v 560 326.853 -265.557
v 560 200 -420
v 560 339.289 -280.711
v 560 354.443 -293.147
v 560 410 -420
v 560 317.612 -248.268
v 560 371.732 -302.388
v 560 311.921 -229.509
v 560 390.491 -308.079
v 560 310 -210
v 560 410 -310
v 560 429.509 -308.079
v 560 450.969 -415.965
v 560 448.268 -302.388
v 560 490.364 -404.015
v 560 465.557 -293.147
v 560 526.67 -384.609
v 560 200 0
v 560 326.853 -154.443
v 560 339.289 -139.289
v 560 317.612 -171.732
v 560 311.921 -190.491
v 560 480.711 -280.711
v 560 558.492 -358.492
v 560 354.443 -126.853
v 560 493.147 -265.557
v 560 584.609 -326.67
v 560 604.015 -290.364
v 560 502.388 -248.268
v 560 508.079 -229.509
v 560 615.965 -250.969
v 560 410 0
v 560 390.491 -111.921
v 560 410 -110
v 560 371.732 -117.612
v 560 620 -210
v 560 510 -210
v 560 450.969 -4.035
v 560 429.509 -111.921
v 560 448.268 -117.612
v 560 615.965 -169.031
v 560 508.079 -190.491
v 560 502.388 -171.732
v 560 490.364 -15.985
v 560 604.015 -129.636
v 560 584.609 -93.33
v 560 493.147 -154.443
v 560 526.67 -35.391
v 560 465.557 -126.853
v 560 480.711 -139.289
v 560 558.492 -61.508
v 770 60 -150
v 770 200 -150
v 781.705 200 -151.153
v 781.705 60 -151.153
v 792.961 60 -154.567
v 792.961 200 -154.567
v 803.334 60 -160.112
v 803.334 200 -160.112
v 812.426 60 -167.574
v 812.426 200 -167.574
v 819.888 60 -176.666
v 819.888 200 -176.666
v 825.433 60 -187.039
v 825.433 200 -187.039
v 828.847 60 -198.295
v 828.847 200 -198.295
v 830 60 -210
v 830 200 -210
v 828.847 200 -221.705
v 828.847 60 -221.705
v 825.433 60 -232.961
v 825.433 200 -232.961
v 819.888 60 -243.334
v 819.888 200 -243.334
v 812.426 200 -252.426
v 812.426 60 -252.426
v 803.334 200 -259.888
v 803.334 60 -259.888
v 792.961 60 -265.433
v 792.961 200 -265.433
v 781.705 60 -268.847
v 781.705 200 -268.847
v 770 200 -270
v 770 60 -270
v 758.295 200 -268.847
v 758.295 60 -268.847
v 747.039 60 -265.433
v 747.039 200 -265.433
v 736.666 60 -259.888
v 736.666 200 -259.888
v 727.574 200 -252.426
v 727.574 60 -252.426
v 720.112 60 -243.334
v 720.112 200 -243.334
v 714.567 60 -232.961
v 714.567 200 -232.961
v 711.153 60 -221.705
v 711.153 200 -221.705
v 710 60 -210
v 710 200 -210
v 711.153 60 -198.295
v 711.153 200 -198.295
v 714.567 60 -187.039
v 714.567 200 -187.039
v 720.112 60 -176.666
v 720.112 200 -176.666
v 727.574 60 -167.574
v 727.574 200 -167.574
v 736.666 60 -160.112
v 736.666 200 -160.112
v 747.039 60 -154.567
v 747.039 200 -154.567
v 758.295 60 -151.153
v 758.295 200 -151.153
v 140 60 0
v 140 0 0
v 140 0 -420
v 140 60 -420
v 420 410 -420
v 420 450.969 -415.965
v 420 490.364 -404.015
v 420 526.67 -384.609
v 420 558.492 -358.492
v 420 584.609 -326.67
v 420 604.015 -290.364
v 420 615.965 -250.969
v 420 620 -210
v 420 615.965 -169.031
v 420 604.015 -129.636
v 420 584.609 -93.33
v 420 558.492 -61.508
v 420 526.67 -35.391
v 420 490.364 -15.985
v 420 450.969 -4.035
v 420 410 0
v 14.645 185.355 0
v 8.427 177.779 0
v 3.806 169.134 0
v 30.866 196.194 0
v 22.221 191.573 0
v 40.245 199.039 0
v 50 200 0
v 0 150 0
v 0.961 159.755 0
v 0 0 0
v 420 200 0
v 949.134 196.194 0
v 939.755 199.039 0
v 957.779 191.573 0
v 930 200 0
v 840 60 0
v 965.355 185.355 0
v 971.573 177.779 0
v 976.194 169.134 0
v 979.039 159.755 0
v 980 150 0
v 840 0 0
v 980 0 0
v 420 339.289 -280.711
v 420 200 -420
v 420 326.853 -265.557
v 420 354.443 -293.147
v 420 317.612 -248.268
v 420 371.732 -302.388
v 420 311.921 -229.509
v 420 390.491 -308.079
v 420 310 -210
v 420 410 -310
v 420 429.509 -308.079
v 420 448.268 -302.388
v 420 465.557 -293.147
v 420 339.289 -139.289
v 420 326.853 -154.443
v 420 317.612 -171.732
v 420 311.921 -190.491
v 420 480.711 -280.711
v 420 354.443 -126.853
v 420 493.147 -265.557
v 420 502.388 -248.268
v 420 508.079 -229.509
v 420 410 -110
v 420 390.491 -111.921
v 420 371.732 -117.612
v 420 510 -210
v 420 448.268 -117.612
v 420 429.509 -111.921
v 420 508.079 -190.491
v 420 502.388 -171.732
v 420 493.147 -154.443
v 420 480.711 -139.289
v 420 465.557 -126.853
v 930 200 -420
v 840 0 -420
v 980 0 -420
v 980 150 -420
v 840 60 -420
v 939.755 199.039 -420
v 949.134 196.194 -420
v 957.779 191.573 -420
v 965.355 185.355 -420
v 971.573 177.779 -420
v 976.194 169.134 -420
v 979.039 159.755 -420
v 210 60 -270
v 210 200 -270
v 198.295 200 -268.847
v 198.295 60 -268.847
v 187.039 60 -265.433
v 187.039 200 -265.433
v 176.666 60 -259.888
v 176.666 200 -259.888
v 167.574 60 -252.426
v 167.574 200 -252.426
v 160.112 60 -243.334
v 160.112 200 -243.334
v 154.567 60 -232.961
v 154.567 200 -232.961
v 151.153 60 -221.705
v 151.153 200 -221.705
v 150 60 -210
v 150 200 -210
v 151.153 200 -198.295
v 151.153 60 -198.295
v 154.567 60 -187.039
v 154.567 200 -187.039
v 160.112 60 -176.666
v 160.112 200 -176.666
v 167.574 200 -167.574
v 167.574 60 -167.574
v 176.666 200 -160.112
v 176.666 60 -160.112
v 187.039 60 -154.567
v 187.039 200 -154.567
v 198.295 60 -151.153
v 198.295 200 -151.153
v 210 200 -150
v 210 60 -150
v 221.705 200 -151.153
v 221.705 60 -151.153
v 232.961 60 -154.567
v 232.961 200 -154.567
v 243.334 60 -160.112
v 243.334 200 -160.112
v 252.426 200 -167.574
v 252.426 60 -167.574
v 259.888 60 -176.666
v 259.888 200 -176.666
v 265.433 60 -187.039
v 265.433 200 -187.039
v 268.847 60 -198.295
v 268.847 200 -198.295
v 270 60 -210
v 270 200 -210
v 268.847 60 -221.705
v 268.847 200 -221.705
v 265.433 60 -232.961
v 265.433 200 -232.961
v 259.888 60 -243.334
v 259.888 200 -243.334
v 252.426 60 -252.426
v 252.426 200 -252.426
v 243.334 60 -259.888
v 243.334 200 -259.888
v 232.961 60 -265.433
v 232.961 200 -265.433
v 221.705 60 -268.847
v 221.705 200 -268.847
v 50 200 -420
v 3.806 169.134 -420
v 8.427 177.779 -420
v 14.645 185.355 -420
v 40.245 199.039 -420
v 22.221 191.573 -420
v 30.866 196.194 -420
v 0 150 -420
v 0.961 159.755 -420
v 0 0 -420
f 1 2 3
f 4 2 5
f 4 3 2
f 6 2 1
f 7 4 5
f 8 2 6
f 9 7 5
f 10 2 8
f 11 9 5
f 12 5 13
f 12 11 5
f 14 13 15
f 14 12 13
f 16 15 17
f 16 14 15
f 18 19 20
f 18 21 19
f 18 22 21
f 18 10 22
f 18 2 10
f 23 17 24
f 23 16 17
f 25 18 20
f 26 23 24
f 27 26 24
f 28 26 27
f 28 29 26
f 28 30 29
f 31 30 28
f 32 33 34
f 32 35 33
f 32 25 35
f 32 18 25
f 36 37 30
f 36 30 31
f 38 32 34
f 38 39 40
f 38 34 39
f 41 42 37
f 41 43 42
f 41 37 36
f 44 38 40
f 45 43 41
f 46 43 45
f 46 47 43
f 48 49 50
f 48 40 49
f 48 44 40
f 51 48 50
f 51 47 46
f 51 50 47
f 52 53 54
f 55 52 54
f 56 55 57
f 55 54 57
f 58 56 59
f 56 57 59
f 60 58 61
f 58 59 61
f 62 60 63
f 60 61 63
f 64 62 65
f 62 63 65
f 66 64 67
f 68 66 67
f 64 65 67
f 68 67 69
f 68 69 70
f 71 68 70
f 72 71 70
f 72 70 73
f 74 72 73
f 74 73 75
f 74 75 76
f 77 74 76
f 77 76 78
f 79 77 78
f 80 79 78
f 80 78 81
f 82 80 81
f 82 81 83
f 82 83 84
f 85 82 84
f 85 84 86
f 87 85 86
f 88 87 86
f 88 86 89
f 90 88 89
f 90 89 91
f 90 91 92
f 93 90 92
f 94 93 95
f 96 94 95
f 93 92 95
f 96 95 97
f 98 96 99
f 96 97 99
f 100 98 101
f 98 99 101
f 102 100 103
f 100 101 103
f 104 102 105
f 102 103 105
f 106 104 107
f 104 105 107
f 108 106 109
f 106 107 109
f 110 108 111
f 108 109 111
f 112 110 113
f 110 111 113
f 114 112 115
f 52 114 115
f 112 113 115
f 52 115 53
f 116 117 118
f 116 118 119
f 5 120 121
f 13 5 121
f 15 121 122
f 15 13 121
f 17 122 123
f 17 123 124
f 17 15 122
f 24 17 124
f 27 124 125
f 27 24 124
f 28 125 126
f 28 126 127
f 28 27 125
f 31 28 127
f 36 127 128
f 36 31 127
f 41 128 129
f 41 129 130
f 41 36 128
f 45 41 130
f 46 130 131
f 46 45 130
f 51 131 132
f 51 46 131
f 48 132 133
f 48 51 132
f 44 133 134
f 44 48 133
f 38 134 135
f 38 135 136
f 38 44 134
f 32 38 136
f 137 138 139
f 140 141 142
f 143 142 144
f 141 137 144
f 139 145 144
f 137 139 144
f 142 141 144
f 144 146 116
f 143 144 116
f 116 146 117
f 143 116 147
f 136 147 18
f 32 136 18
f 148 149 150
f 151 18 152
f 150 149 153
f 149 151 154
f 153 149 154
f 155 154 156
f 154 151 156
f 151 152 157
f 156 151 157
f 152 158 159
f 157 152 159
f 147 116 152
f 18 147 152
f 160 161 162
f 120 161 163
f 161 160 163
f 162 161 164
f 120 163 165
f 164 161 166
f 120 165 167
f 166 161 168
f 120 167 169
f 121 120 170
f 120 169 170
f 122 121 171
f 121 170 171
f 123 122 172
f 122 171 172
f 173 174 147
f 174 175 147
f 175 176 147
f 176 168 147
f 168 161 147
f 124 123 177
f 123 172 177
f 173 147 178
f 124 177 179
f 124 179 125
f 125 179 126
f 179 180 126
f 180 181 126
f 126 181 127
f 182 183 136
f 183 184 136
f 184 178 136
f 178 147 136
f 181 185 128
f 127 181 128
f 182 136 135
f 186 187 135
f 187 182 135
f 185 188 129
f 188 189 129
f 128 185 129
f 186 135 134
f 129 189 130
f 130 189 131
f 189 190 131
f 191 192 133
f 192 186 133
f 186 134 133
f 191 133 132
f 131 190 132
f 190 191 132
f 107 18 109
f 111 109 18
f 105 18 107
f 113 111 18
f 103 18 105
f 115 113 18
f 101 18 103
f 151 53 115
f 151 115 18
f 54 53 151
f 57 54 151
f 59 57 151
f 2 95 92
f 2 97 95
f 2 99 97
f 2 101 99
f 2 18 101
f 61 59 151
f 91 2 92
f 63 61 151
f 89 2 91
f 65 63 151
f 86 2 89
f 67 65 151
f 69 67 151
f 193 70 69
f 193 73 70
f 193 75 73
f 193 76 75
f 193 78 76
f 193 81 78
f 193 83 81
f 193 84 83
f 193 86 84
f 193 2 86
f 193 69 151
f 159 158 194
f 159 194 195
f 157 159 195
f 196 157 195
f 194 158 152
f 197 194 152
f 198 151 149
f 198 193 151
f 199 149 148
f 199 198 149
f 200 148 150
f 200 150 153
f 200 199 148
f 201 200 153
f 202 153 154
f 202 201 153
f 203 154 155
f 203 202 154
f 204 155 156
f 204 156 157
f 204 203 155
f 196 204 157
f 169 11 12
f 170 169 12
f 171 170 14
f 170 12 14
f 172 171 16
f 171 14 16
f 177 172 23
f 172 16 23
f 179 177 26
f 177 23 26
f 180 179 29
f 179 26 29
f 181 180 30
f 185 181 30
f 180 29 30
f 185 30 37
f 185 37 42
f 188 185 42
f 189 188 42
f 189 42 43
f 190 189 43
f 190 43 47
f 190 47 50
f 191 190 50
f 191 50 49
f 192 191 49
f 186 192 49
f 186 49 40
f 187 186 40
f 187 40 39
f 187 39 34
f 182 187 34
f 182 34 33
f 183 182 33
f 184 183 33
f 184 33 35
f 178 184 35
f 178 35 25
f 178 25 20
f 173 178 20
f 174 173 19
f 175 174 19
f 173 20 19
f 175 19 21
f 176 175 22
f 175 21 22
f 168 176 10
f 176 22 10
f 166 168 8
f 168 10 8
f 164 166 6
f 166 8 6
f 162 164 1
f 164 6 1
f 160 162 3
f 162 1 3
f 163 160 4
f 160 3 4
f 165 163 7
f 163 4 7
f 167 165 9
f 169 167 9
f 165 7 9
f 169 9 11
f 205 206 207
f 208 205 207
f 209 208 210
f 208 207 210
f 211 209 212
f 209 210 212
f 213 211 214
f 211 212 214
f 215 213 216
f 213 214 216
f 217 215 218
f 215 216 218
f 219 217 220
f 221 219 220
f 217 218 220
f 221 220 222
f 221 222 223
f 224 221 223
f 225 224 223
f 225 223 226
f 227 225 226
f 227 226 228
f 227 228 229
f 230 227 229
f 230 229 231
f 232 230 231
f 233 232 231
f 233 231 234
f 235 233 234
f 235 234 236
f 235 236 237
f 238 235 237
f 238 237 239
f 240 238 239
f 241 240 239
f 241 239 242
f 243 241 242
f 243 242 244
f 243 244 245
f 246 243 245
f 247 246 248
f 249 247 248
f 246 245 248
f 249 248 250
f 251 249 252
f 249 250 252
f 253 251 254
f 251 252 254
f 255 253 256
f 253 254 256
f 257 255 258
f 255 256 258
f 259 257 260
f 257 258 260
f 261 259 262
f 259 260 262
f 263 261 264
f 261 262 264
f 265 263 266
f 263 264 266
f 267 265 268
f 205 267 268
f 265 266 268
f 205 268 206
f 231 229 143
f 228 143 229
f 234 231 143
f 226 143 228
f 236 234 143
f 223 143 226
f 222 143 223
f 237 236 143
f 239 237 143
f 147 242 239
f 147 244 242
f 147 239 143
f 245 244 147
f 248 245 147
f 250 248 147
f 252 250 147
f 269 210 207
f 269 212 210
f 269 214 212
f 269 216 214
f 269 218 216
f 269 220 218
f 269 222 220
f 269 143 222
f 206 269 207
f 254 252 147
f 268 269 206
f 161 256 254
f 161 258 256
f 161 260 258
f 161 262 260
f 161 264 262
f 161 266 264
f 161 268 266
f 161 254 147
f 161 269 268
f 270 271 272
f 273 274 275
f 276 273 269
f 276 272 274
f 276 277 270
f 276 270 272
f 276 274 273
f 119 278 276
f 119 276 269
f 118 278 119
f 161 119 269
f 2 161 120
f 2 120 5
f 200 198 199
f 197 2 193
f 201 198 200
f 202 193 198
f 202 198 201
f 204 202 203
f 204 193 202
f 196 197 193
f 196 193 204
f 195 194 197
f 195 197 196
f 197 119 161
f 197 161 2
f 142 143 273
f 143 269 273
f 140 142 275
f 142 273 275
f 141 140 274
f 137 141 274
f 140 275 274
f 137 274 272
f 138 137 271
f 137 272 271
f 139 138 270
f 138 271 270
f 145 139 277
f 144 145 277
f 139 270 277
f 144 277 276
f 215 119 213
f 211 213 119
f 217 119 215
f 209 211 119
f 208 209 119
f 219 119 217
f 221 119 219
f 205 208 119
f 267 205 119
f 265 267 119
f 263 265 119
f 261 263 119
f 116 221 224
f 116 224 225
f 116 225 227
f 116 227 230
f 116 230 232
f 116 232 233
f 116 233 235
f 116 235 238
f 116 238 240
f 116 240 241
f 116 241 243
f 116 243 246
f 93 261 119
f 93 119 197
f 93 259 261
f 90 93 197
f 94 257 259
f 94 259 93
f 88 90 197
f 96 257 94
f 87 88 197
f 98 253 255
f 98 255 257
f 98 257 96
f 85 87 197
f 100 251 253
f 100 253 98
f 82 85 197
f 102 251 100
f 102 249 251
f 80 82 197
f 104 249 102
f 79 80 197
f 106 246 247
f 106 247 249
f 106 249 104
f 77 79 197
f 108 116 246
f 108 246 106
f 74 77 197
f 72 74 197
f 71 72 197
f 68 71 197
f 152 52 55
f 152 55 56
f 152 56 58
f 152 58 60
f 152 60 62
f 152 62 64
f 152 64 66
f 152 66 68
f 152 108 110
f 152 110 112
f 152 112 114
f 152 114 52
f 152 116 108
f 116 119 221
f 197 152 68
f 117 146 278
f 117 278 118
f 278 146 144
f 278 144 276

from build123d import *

# Parameters (mm, degrees)
SKETCH1_W           = 980
SKETCH1_H           = 420
BOSS_EXTRUDE1_DEPTH = 200
SKETCH2_W           = 700
SKETCH2_H           = 60
CUT_EXTRUDE1_DEPTH  = 420
SKETCH3_W           = 140
SKETCH3_H           = 420
BOSS_EXTRUDE2_DEPTH = 420
SKETCH4_R           = 100
CUT_EXTRUDE2_DEPTH  = 200
SKETCH5_R           = 60
CUT_EXTRUDE3_DEPTH  = 200
FILLET1_RADIUS      = 210
FILLET1_LENGTH      = 140
FILLET2_R           = 50
FILLET3_R           = 50


with BuildPart() as part:
    # Sketch1 → Boss-Extrude1 (new body)
    with BuildSketch(Plane(origin=(0, 0, 0), x_dir=(1, 0, 0), z_dir=(0, 1, 0))):
        with Locations((490, 210)):
            Rectangle(SKETCH1_W, SKETCH1_H)
    extrude(amount=BOSS_EXTRUDE1_DEPTH)

    # Sketch2 → Cut-Extrude1 (cut)
    with BuildSketch(Plane.XY):
        with Locations((490, 30)):
            Rectangle(SKETCH2_W, SKETCH2_H)
    extrude(amount=-CUT_EXTRUDE1_DEPTH, mode=Mode.SUBTRACT)

    # Sketch3 → Boss-Extrude2 (add)
    with BuildSketch(Plane.XY):
        with Locations((490, 410)):
            Rectangle(SKETCH3_W, SKETCH3_H)
    extrude(amount=-BOSS_EXTRUDE2_DEPTH)

    # Sketch4 → Cut-Extrude2 (cut)
    with BuildSketch(Plane(origin=(560, 0, 0), x_dir=(0, 0, -1), z_dir=(1, 0, 0))):
        with Locations((210, 410)):
            Circle(SKETCH4_R)
    extrude(amount=-CUT_EXTRUDE2_DEPTH, mode=Mode.SUBTRACT)

    # Sketch5 → Cut-Extrude3 (cut)
    with BuildSketch(Plane(origin=(0, 200, 0), x_dir=(1, 0, 0), z_dir=(0, 1, 0))):
        with Locations(Location((770, 210, 0), (0, 0, 270))):
            Circle(SKETCH5_R)
        with Locations(Location((210, 210, 0), (0, 0, 90))):
            Circle(SKETCH5_R)
    extrude(amount=-CUT_EXTRUDE3_DEPTH, mode=Mode.SUBTRACT)

    # Fillet1: full round fillet: the end face becomes a half cylinder, R = half its width
    fillet1_face = Plane((490, 620, -210), x_dir=(1, 0, 0), z_dir=(0, 1, 0))  # on the end face: x along it, z out of the body
    fillet1_slab = fillet1_face.offset(-FILLET1_RADIUS / 2) * Box(FILLET1_LENGTH, 2 * FILLET1_RADIUS, FILLET1_RADIUS, mode=Mode.PRIVATE)  # the body's end, R deep
    fillet1_round = Plane((490, 410, -210), x_dir=(0, 1, 0), z_dir=(1, 0, 0)) * Cylinder(FILLET1_RADIUS, FILLET1_LENGTH, mode=Mode.PRIVATE)  # its axis R under the face
    add(fillet1_slab - fillet1_round, mode=Mode.SUBTRACT)

    # Fillet2
    fillet2_edges = [part.edges().sort_by_distance(p)[0] for p in [
        (980, 200, -210),
    ]]
    fillet(fillet2_edges, radius=FILLET2_R)

    # Fillet3
    fillet3_edges = [part.edges().sort_by_distance(p)[0] for p in [
        (0, 200, -210),
    ]]
    fillet(fillet3_edges, radius=FILLET3_R)


solid = part.part
